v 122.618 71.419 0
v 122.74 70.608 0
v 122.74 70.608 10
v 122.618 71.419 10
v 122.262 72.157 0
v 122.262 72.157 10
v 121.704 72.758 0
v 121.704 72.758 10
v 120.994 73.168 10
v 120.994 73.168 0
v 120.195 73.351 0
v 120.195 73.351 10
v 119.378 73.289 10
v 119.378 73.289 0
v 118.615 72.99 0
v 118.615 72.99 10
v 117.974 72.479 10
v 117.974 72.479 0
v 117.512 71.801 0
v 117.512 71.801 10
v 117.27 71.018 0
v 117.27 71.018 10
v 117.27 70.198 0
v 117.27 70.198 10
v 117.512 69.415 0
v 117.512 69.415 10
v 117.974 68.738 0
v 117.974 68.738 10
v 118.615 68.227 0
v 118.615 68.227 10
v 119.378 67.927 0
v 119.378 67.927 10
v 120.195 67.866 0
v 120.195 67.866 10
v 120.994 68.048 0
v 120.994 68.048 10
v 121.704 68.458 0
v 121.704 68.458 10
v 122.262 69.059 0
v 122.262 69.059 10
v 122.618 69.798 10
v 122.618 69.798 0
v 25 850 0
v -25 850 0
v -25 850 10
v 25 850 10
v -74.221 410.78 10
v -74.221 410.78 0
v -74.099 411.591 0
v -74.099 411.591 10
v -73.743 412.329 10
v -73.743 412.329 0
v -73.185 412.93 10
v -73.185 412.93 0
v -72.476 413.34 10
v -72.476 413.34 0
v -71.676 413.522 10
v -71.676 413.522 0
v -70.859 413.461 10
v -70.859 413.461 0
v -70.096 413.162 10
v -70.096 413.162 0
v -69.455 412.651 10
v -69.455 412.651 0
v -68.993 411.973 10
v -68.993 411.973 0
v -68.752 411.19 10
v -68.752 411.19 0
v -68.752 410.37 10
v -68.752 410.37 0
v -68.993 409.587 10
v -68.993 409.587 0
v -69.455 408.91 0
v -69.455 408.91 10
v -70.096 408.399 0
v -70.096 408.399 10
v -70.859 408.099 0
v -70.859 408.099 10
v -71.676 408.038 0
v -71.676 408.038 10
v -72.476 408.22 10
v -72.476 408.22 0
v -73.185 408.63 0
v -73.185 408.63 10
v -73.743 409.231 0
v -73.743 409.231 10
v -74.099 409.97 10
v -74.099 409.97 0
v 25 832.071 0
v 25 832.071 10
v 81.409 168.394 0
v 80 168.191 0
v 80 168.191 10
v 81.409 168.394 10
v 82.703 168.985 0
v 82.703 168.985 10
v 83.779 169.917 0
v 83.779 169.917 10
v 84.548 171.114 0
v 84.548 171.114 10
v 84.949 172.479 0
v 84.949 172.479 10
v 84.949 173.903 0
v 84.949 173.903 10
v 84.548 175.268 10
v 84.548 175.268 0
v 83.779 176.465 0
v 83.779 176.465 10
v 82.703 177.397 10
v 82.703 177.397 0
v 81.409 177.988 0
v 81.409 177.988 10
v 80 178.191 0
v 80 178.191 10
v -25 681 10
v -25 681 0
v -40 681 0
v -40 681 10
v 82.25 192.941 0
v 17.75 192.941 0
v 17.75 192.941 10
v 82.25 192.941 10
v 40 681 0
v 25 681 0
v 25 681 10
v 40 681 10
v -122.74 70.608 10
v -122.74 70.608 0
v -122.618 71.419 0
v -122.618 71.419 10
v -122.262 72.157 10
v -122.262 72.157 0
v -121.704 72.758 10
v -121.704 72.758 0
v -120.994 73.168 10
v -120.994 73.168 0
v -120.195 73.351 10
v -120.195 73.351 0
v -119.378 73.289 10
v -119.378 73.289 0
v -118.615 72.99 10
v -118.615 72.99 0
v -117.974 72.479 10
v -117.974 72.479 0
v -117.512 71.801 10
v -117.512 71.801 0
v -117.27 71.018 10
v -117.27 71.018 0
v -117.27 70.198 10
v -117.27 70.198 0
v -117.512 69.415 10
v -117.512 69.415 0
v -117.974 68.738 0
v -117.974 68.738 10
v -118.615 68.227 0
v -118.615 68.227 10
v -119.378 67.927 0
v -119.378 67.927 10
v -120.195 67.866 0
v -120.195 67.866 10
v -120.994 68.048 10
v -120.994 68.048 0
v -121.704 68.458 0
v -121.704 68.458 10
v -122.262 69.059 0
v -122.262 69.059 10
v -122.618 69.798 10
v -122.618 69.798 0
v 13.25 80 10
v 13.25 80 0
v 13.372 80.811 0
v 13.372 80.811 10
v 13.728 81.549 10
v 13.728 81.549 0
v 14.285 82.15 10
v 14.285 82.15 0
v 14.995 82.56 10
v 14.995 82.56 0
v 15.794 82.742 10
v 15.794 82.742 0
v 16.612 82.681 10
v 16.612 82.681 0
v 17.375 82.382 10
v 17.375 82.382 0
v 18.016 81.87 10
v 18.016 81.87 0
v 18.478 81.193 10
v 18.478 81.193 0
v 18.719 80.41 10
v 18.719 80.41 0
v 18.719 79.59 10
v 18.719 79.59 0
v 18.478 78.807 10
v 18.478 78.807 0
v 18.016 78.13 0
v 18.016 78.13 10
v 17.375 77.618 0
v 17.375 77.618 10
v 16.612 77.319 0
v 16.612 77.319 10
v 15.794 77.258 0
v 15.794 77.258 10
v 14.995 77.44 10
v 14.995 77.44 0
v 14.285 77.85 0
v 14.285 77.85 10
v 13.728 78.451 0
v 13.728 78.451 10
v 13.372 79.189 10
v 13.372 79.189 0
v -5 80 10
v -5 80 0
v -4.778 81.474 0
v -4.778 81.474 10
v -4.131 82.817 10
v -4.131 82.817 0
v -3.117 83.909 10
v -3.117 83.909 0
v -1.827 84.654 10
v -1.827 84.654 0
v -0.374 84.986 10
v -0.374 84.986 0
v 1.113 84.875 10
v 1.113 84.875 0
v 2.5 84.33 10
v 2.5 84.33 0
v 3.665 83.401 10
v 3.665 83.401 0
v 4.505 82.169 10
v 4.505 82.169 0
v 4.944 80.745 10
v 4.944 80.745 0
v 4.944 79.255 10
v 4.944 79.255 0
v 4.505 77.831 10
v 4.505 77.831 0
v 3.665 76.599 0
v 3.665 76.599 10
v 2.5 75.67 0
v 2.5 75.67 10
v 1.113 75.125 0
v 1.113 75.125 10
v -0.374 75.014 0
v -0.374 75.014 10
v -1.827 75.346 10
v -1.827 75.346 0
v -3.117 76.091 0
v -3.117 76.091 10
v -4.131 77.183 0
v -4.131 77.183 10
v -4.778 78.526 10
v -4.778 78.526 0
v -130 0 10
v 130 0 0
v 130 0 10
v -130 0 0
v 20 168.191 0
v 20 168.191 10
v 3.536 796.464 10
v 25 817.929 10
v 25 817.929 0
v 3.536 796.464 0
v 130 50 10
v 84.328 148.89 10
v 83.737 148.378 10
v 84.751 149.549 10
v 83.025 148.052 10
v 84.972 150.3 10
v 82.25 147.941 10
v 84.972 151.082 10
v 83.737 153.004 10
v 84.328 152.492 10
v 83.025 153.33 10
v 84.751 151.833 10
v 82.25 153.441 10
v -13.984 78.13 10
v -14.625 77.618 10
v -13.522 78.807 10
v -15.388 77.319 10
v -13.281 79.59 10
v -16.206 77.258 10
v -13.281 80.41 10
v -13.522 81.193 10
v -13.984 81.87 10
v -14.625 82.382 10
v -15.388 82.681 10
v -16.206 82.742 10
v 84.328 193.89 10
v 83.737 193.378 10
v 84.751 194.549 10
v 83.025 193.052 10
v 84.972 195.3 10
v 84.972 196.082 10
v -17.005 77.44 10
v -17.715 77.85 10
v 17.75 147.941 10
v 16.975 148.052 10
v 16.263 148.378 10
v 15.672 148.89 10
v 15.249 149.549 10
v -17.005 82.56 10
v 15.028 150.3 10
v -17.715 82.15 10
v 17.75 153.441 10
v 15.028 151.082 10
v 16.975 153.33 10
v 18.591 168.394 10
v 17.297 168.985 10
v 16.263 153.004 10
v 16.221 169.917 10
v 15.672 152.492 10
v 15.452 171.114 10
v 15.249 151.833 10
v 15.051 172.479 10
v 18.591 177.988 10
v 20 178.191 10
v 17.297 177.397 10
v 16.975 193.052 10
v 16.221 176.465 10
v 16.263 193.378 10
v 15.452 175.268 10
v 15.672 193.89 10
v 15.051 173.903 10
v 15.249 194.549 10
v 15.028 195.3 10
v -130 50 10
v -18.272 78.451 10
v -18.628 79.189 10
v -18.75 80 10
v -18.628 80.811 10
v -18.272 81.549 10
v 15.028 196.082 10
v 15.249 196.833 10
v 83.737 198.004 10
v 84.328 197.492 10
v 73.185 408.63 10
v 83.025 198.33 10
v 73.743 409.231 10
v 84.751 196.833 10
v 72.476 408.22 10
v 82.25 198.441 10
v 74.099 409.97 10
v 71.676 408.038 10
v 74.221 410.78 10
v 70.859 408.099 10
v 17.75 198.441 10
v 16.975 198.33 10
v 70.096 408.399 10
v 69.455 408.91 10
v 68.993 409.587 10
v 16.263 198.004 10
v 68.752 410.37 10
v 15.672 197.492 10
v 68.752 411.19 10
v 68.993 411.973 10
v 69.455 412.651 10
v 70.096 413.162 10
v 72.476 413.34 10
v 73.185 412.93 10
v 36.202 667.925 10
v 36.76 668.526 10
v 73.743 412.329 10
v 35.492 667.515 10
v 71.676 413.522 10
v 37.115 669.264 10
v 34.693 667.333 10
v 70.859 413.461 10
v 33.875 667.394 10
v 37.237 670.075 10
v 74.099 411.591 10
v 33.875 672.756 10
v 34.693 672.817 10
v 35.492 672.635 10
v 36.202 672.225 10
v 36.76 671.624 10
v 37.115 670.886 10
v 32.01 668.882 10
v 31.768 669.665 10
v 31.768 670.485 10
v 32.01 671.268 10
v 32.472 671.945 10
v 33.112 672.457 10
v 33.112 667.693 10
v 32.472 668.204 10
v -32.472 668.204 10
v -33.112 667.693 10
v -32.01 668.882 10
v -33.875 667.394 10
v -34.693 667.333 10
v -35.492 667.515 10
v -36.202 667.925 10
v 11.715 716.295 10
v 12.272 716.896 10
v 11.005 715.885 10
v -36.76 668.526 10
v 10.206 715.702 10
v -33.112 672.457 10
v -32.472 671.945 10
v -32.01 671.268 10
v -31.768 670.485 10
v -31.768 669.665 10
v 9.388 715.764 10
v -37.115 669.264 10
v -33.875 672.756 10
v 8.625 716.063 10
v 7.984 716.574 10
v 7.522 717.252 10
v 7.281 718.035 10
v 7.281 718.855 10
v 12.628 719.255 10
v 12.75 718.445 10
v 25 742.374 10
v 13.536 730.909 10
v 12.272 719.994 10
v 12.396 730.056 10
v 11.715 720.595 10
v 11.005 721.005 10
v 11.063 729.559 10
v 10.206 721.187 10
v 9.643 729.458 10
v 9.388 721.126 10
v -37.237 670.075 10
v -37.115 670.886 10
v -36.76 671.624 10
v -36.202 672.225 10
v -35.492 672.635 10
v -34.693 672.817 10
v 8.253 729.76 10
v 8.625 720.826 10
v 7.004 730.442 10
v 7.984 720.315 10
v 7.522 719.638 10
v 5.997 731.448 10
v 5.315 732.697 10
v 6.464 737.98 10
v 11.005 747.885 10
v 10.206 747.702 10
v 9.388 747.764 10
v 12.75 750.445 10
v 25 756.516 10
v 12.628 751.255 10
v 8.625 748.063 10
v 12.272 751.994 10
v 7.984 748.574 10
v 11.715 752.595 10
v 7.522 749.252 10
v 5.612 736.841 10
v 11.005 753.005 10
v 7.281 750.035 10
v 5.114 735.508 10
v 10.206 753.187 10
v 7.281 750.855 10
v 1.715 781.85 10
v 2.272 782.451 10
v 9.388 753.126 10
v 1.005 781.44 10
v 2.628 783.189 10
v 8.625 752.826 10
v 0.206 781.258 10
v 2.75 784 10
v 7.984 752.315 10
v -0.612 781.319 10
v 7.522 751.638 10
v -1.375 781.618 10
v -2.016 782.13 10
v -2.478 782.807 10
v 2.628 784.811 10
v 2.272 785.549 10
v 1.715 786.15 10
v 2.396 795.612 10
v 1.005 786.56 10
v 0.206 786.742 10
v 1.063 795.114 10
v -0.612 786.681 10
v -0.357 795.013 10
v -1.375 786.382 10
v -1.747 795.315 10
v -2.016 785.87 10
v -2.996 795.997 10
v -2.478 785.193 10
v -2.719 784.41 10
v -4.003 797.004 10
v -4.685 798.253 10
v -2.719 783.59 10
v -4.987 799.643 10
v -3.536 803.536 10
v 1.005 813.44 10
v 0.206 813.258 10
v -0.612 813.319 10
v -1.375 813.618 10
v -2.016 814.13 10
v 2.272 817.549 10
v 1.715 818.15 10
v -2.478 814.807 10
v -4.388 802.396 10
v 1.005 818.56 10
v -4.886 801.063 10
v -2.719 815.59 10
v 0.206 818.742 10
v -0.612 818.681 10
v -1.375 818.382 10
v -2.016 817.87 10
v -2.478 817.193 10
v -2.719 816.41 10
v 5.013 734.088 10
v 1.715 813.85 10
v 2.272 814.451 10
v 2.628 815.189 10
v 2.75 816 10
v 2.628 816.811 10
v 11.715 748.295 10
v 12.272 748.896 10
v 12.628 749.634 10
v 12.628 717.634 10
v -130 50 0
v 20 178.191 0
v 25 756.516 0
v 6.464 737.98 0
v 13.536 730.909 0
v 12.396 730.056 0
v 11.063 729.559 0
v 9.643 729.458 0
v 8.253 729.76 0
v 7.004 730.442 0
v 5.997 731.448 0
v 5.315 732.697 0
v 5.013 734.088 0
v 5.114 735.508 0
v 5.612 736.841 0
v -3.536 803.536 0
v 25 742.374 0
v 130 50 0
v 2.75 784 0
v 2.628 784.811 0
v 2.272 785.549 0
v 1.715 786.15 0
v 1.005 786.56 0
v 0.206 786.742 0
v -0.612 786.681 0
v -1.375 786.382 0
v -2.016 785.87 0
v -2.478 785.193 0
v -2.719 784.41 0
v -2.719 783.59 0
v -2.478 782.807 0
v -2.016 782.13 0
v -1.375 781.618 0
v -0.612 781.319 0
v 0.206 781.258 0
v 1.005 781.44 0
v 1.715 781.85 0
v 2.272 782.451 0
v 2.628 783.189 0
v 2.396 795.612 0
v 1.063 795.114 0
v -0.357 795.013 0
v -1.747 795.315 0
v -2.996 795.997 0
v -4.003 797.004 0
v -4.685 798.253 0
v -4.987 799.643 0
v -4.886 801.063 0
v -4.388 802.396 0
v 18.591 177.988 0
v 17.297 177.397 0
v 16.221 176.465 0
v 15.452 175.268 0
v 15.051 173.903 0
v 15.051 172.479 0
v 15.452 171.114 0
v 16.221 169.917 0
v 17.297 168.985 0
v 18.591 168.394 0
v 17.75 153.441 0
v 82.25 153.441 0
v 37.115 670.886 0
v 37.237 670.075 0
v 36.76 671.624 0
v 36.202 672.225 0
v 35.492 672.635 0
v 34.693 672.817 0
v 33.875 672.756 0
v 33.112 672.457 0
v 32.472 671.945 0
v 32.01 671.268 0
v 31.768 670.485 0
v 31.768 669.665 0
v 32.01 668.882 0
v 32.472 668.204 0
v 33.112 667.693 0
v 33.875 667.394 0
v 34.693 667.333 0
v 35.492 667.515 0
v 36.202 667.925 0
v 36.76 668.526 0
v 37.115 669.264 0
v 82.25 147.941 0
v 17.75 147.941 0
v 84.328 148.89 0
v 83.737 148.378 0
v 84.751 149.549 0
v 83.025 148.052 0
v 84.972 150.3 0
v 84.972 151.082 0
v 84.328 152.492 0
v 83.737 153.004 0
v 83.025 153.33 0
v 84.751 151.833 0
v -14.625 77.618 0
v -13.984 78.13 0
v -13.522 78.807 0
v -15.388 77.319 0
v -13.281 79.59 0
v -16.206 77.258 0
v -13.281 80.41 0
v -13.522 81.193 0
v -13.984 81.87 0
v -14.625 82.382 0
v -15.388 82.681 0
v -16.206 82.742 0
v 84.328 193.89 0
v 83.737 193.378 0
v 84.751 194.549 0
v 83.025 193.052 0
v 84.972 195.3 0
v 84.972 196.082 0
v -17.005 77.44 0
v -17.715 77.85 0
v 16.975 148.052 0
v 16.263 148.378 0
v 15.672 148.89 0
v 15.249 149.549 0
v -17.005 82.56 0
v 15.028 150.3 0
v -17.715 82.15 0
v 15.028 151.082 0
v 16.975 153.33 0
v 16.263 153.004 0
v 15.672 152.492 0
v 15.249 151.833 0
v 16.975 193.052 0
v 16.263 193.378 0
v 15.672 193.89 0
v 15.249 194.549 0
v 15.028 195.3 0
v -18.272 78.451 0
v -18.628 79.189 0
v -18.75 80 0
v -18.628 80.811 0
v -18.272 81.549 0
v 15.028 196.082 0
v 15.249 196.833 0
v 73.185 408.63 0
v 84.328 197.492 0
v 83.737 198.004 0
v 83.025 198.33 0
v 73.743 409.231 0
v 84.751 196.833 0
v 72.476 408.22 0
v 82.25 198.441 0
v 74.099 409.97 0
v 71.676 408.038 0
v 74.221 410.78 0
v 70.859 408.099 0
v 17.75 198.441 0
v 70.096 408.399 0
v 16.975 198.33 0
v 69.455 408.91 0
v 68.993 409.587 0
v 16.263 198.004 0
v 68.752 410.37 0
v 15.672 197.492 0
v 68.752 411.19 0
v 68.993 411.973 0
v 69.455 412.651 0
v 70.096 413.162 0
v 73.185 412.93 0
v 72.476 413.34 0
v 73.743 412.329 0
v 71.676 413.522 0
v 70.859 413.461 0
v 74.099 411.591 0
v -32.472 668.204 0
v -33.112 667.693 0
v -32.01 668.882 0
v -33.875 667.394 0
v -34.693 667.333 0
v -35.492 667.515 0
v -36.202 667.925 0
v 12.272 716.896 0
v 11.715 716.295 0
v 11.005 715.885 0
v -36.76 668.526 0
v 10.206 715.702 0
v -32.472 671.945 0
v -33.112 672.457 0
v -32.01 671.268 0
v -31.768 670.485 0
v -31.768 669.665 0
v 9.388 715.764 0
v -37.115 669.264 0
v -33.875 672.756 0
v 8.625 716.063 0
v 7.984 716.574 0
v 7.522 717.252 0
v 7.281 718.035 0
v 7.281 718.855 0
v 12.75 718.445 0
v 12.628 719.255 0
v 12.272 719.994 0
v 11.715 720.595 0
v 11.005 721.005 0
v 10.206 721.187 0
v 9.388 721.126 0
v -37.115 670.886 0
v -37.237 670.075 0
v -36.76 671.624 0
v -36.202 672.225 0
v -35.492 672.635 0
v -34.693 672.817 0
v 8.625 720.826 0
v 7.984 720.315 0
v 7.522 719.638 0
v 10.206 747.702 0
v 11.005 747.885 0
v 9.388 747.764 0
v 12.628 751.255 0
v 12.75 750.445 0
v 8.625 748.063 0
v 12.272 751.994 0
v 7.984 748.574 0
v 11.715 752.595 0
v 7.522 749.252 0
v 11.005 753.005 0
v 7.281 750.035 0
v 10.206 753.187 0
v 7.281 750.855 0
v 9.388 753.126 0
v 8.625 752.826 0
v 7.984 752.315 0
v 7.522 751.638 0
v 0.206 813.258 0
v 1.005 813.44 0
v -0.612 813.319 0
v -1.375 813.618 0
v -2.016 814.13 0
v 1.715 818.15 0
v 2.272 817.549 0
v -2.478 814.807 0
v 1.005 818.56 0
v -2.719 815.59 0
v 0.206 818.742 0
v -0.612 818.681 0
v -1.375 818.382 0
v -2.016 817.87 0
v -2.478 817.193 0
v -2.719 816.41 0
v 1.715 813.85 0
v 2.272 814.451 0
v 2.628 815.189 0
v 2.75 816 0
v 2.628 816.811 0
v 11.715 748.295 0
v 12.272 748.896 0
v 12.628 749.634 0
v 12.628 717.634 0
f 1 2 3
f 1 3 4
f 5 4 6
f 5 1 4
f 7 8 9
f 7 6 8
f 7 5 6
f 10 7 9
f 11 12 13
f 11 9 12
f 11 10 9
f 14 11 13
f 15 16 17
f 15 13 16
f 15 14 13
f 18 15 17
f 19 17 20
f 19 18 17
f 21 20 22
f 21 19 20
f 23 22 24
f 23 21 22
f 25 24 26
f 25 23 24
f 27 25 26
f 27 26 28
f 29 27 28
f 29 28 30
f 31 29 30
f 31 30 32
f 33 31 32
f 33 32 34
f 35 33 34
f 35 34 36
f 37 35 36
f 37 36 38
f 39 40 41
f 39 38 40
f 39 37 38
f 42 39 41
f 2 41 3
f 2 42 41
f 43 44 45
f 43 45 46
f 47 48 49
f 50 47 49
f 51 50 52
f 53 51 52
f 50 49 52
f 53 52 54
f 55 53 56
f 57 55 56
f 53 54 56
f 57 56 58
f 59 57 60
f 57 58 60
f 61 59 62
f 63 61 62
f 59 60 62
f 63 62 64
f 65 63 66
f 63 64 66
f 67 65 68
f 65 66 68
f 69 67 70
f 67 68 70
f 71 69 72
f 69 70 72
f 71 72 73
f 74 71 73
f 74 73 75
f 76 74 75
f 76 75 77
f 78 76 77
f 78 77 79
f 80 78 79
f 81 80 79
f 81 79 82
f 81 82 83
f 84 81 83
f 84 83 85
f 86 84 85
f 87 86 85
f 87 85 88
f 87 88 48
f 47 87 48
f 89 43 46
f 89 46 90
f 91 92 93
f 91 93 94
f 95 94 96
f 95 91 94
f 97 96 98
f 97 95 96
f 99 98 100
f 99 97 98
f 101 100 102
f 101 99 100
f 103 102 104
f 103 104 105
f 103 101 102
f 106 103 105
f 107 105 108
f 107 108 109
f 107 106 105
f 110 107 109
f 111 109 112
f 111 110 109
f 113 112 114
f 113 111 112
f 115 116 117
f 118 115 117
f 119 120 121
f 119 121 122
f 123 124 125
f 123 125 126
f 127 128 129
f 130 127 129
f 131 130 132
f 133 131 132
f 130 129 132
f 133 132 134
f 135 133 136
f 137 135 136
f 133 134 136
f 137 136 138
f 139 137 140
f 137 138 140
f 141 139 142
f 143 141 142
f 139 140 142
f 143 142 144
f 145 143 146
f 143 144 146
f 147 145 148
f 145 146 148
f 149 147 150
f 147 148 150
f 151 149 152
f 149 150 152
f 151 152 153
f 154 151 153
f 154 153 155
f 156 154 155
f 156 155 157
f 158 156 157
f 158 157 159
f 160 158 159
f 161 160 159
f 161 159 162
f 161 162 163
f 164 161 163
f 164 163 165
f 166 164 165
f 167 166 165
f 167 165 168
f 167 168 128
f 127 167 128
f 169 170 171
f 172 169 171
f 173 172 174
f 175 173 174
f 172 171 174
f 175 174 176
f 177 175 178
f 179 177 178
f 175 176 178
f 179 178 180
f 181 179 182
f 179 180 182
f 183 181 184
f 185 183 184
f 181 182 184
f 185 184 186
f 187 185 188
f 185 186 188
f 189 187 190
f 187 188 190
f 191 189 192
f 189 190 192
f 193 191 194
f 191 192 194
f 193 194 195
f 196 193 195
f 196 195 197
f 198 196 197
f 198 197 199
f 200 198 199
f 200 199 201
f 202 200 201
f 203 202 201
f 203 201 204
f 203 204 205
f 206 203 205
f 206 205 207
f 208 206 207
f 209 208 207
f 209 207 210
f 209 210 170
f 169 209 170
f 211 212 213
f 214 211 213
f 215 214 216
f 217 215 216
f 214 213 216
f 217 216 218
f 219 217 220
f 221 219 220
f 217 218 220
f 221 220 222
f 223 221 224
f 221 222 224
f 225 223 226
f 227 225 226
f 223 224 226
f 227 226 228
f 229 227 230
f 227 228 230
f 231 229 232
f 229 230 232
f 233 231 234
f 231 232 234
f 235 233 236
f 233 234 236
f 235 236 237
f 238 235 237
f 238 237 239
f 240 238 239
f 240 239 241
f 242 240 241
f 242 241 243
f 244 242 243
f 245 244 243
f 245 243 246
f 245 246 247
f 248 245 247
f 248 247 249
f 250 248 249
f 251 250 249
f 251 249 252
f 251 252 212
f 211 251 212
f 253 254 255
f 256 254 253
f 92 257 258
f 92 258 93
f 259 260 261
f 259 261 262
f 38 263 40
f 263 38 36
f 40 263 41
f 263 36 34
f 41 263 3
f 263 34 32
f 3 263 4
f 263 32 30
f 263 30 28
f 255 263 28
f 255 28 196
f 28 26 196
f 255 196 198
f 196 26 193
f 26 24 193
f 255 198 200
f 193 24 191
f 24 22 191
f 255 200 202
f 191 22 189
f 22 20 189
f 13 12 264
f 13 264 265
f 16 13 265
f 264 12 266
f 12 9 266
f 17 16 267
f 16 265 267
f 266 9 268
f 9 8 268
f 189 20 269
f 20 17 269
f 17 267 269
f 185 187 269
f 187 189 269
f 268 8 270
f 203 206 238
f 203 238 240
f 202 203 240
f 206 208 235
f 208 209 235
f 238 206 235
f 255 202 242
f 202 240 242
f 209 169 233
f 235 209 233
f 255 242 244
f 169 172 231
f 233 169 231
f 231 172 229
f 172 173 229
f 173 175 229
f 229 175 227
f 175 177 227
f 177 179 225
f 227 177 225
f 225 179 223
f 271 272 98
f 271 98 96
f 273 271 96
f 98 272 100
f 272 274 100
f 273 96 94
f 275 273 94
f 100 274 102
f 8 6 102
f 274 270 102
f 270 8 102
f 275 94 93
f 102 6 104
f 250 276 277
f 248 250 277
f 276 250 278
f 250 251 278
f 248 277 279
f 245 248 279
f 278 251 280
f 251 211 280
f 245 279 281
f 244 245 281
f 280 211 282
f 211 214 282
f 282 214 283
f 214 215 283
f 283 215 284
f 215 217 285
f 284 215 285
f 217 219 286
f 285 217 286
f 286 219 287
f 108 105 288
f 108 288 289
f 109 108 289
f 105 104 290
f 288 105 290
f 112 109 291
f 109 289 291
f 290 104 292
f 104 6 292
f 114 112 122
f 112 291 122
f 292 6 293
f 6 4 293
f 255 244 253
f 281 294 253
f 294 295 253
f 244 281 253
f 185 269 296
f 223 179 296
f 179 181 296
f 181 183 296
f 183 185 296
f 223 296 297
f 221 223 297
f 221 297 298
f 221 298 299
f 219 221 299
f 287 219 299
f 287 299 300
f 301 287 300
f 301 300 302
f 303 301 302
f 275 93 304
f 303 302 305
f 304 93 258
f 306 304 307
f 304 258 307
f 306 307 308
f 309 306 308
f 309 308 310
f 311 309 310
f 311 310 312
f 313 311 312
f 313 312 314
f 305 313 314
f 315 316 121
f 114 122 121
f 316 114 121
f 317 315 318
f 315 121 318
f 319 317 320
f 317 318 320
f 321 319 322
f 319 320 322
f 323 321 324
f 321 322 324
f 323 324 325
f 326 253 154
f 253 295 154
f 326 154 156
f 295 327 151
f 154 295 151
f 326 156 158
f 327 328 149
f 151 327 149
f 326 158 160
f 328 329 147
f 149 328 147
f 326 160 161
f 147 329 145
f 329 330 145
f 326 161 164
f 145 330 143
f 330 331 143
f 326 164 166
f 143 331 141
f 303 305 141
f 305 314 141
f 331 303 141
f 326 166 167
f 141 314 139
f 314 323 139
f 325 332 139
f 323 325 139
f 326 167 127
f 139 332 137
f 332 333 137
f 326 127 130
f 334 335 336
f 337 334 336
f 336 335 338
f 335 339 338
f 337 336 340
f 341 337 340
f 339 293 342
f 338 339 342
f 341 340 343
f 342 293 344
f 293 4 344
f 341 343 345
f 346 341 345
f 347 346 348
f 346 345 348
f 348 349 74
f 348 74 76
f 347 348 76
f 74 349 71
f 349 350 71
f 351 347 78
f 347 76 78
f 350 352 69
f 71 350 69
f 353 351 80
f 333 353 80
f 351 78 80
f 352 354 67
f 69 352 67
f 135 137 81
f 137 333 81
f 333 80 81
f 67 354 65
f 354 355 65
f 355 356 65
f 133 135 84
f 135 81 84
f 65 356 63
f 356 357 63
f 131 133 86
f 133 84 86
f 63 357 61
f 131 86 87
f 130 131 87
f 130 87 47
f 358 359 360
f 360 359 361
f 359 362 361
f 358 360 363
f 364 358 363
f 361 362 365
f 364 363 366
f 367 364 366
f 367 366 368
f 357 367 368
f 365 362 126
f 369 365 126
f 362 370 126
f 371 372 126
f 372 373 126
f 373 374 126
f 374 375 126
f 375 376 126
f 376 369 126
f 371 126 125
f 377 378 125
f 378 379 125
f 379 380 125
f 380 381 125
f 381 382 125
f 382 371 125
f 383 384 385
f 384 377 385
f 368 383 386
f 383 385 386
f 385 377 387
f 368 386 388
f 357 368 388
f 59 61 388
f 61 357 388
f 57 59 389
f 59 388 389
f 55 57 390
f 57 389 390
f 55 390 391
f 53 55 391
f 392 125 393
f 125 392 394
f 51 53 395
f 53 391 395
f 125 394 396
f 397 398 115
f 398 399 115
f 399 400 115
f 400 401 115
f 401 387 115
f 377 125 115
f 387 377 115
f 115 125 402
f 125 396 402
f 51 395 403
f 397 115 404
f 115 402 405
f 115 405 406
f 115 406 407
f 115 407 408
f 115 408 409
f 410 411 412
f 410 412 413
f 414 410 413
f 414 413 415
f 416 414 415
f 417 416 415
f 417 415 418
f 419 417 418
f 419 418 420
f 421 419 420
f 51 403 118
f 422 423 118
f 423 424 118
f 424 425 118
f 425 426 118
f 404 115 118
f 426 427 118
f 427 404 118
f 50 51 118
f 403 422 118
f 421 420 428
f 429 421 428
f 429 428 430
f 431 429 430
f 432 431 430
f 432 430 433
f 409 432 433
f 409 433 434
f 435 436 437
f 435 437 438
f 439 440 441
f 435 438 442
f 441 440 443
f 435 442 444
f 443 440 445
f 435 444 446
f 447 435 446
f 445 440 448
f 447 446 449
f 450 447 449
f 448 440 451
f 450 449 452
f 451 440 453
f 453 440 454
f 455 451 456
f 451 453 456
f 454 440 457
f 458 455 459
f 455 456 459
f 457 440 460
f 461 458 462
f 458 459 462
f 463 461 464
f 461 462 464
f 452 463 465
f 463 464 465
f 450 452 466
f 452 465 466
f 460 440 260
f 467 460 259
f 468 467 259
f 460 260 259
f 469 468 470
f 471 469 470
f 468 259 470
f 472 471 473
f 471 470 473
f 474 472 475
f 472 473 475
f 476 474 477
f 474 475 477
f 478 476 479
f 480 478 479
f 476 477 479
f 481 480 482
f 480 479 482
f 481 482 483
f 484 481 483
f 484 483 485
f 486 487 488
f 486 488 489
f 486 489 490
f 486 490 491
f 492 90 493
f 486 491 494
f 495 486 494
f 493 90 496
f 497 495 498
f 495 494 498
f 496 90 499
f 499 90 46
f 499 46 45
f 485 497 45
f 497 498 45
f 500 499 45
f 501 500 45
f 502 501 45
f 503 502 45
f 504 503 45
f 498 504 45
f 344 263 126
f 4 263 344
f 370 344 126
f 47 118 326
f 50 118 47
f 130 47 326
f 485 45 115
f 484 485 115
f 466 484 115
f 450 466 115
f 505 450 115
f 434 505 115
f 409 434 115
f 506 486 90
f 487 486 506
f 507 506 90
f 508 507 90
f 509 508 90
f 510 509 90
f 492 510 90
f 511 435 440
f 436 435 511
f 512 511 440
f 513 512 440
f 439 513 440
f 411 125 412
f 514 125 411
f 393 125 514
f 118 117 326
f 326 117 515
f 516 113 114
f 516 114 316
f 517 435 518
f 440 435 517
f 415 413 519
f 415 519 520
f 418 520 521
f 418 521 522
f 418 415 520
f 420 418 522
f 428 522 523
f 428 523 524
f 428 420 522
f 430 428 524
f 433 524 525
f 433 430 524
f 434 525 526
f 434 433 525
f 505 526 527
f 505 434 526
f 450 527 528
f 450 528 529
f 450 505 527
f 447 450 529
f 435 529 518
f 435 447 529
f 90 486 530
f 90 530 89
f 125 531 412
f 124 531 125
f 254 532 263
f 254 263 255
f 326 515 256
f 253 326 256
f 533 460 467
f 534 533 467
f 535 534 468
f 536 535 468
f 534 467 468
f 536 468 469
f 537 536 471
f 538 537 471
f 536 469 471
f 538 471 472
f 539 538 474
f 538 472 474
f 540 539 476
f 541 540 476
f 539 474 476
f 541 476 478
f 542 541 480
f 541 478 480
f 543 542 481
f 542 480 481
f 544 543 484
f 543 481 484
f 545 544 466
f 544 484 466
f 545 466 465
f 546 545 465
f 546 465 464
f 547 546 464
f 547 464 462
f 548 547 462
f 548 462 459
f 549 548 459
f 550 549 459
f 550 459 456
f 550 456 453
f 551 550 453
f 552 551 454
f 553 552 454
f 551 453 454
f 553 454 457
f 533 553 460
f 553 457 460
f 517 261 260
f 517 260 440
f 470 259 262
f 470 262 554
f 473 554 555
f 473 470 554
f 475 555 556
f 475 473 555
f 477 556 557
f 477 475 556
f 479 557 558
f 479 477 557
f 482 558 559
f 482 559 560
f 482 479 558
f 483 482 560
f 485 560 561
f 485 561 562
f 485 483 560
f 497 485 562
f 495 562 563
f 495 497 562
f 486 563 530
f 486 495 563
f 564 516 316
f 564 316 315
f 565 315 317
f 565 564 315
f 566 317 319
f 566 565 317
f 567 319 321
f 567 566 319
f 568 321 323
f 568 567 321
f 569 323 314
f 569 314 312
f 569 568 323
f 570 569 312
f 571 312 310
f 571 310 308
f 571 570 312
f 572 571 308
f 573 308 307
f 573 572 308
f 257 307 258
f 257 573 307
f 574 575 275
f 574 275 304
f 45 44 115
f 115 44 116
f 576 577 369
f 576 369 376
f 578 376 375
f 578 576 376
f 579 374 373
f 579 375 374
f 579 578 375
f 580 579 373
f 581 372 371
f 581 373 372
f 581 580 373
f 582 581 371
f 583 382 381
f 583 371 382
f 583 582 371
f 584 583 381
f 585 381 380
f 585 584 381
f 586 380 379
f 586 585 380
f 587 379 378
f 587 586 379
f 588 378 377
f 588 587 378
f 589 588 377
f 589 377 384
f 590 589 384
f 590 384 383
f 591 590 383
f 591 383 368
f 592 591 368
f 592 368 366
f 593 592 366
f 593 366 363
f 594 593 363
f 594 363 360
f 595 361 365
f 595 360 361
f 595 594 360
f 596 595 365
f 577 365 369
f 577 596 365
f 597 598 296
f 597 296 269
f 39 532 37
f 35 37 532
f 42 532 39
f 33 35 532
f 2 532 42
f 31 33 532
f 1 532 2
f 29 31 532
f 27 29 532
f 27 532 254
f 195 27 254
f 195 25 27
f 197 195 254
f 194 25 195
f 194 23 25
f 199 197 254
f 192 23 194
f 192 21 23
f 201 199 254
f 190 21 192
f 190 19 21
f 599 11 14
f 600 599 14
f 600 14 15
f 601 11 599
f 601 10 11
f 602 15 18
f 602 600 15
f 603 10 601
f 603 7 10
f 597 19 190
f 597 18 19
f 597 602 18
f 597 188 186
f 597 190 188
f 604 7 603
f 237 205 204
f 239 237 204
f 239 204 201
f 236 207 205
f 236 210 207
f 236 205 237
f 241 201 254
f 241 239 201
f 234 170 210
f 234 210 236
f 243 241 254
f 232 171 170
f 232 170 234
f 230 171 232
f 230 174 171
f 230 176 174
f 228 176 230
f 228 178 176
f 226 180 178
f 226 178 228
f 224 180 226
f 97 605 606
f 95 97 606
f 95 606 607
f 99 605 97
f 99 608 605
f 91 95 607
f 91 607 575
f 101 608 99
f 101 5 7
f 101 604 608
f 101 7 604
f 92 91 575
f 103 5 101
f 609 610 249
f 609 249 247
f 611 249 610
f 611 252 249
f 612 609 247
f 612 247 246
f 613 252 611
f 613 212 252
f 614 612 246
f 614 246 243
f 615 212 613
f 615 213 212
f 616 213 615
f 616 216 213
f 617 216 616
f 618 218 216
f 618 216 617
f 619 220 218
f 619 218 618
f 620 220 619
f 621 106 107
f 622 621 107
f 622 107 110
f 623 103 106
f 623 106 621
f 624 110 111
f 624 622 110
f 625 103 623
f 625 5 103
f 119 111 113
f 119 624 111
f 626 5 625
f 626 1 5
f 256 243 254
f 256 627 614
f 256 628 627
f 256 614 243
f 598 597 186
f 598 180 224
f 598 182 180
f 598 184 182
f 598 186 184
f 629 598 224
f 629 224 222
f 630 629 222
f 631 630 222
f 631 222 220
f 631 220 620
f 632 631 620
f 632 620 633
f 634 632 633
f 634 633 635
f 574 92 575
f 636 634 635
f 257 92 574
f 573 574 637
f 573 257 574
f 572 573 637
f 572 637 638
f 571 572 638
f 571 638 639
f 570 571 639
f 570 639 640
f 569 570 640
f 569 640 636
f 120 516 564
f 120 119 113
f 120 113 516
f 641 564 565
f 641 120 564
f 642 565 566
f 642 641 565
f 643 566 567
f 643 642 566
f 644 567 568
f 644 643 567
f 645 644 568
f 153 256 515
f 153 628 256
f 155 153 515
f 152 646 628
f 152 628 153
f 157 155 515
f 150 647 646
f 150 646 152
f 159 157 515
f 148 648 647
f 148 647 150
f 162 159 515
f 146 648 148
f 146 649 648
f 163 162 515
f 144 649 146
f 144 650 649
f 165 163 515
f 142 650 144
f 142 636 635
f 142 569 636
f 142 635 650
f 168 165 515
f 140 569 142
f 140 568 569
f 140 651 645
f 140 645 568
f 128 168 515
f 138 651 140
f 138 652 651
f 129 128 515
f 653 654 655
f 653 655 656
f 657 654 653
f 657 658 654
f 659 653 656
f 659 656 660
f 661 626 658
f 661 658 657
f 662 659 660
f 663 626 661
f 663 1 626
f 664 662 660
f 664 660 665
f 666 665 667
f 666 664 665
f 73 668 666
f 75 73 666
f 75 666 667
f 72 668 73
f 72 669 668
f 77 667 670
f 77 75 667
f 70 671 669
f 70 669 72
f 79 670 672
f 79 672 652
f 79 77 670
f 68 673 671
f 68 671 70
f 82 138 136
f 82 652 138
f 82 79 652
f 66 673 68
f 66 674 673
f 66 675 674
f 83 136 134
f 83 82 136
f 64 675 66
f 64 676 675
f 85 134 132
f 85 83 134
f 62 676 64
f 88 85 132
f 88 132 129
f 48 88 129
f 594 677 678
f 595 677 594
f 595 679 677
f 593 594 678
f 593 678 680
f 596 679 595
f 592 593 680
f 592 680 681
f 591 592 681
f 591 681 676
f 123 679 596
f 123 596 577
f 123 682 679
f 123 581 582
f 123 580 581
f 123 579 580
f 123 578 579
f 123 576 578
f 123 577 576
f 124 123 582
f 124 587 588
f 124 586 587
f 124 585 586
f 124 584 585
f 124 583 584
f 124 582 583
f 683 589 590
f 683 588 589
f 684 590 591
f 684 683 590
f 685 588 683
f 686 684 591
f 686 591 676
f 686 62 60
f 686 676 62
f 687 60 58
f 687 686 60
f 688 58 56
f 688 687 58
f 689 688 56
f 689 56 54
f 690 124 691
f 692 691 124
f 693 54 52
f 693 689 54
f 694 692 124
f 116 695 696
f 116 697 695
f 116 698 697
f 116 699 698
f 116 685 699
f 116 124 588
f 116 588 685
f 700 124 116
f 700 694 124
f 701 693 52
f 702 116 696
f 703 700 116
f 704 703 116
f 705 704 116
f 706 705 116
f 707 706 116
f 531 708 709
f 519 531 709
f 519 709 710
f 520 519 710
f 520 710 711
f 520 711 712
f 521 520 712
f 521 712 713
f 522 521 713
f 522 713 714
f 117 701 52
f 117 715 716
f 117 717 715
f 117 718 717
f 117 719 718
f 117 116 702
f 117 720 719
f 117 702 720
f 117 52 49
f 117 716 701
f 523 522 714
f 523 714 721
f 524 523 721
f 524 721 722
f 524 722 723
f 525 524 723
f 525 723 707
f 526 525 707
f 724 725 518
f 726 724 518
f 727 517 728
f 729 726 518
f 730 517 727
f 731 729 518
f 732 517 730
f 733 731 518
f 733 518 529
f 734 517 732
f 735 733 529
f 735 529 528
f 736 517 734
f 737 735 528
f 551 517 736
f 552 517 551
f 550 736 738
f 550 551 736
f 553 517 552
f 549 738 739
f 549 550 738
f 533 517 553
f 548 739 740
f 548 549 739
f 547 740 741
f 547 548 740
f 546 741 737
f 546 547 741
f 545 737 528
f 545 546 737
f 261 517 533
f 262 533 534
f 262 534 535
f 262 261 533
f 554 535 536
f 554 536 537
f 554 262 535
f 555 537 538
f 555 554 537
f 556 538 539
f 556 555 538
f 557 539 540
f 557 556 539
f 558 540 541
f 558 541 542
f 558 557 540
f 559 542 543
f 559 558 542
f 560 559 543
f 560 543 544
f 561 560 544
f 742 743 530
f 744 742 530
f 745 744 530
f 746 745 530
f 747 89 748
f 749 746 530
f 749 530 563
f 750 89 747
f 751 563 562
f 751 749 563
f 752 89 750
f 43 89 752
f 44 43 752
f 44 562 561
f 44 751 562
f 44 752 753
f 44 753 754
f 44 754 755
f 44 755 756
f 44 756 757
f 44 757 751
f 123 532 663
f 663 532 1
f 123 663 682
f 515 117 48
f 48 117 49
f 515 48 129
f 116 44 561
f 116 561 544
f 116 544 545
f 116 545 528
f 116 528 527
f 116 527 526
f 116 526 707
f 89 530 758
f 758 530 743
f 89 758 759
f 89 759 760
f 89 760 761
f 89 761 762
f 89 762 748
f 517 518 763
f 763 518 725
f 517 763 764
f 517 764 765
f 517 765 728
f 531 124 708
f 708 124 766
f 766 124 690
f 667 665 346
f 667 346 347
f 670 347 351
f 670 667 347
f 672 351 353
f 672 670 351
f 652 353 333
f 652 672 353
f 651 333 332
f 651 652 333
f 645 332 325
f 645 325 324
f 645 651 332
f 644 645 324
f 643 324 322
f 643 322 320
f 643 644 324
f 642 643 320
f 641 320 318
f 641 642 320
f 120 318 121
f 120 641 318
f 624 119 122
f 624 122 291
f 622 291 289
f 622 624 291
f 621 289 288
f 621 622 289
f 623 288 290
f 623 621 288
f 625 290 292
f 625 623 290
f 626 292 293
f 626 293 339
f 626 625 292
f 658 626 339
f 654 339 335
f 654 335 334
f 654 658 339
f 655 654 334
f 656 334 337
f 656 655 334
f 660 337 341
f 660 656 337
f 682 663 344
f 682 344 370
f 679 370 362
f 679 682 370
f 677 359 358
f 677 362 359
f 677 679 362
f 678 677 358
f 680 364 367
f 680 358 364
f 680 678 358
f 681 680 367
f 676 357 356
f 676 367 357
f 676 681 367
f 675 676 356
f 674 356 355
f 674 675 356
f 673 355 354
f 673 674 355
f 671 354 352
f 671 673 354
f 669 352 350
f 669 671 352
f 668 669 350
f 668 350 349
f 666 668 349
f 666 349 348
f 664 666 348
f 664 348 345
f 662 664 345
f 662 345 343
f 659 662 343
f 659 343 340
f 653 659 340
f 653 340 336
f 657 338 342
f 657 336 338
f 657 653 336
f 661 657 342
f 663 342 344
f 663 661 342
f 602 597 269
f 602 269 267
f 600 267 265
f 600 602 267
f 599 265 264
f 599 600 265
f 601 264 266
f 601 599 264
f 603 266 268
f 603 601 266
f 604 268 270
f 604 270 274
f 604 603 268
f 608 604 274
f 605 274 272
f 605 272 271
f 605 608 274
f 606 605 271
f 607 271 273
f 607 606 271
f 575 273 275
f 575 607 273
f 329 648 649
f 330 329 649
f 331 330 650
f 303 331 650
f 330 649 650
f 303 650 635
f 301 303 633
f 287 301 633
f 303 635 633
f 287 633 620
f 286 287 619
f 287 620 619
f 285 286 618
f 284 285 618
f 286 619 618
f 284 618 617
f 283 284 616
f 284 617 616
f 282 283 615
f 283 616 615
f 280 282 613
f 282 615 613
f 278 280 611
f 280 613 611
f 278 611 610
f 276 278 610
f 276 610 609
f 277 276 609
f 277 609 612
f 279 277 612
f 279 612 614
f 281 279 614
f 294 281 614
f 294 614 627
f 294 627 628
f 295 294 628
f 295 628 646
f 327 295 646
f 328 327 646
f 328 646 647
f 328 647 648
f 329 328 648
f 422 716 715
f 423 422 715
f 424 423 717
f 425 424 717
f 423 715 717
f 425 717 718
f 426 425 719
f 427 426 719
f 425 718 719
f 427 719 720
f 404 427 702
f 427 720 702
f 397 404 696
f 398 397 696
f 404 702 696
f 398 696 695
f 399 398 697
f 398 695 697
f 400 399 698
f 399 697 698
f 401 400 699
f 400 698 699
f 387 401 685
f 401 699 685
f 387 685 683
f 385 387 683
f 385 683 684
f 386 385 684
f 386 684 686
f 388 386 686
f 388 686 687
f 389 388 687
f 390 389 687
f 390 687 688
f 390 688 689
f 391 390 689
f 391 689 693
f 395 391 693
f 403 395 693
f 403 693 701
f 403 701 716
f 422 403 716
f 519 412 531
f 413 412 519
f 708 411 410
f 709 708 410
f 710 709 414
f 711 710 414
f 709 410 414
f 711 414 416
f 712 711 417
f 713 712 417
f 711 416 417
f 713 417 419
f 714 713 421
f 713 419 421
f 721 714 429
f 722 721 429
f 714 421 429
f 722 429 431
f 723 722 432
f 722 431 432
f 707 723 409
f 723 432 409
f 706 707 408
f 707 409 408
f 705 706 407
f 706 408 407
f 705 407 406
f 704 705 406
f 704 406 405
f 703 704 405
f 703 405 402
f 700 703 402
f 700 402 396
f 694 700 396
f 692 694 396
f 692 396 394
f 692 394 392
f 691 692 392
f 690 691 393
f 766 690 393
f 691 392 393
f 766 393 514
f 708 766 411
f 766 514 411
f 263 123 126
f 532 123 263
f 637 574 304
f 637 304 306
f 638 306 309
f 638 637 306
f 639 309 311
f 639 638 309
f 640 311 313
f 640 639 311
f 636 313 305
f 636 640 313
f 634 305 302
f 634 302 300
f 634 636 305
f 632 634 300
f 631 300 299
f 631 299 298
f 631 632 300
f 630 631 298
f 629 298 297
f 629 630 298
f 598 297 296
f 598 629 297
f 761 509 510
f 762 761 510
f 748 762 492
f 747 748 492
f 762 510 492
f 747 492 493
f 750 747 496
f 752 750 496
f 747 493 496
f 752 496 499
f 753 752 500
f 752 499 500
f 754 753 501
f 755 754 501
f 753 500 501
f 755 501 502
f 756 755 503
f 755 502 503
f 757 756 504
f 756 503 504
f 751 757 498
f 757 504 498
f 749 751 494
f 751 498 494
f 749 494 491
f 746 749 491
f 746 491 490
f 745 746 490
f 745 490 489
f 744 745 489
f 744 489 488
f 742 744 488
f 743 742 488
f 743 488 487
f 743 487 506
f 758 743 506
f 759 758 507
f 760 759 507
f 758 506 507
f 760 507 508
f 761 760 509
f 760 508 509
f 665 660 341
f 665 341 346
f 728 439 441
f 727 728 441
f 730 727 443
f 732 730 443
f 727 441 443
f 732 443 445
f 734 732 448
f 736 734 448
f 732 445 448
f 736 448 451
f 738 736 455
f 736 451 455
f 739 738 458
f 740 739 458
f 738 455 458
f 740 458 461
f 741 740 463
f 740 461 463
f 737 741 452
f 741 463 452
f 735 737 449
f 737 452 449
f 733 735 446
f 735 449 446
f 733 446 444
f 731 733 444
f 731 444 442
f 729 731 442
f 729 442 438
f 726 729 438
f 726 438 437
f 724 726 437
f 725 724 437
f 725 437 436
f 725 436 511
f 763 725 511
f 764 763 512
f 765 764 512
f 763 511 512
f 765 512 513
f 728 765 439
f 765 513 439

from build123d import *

# Parameters (mm, degrees)
AUFSATZ_LINEAR_AUSTRAGEN1_DEPTH       = 10
SKIZZE17_R                            = 2.75
SCHNITT_LINEAR_AUSTRAGEN1_DEPTH       = 10
F_10_0_10_DURCHMESSER_BOHRUNG1_D      = 10
F_5_5_5_5_DURCHMESSER_BOHRUNG2_D      = 5.5
F_10_0_10_DURCHMESSER_LANGLOCH2_DEPTH = 10
F_5_5_5_5_DURCHMESSER_LANGLOCH2_DEPTH = 10
F_5_5_5_5_DURCHMESSER_BOHRUNG3_D      = 5.5


# Read off the part's stored shape, not the designer's step: Ø10.0 (10) Durchmesser Langloch2, Ø5.5 (5.5) Durchmesser Langloch2
with BuildPart() as part:
    # Skizze1 → Aufsatz-Linear austragen1 (new body)
    with BuildSketch(Plane.XY):
        Polygon((-40, 681), (-130, 50), (-130, 0), (0, 0), (0, 800), (0, 850), (-25, 850), (-25, 800), (-25, 681), align=None)
    aufsatz_linear_austragen1 = extrude(amount=AUFSATZ_LINEAR_AUSTRAGEN1_DEPTH)

    # Spiegeln1: Aufsatz-Linear austragen1 across plane
    add(aufsatz_linear_austragen1.mirror(Plane(origin=(0, 800, 10), x_dir=(0, 0, 1), z_dir=(1, 0, 0))))

    # Skizze17 → Schnitt-Linear austragen1 (cut)
    with BuildSketch(Plane.XY.offset(10)):
        with Locations((0, 816)):
            Circle(SKIZZE17_R)
        with Locations((0, 784)):
            Circle(SKIZZE17_R)
        with Locations((10, 750.444801834)):
            Circle(SKIZZE17_R)
        with Locations((10, 718.444801834)):
            Circle(SKIZZE17_R)
        with BuildLine():
            Line((-3.535533906, 803.535533906), (25, 832.071067812))
            ThreePointArc((25, 832.071067812), (32.071067812, 832.071067812), (32.071067812, 825))
            Line((32.071067812, 825), (3.535533906, 796.464466094))
            ThreePointArc((3.535533906, 796.464466094), (-3.535533906, 796.464466094), (-3.535533906, 803.535533906))
        make_face()
        with BuildLine():
            Line((6.464466094, 737.98033574), (25, 756.515869646))
            ThreePointArc((25, 756.515869646), (32.071067812, 756.515869646), (32.071067812, 749.444801834))
            Line((32.071067812, 749.444801834), (13.535533906, 730.909267928))
            ThreePointArc((13.535533906, 730.909267928), (6.464466094, 730.909267928), (6.464466094, 737.98033574))
        make_face()
    extrude(amount=-SCHNITT_LINEAR_AUSTRAGEN1_DEPTH, mode=Mode.SUBTRACT)

    # Ø10.0 (10) Durchmesser Bohrung1 (through all)
    with Locations(Plane.XY.offset(10)):
        with Locations((0, 80)):
            Hole(F_10_0_10_DURCHMESSER_BOHRUNG1_D / 2)

    # Ø5.5 (5.5) Durchmesser Bohrung2 (through all)
    with Locations(Plane.XY.offset(10)):
        with Locations((-16, 80), (16, 80)):
            Hole(F_5_5_5_5_DURCHMESSER_BOHRUNG2_D / 2)

    # Ø10.0 (10) Durchmesser Langloch2 outline → Ø10.0 (10) Durchmesser Langloch2 (cut)
    with BuildSketch(Plane.XY):
        with BuildLine():
            Line((20, 168.190997141), (80, 168.190997141))
            ThreePointArc((80, 168.190997141), (85, 173.190997141), (80, 178.190997141))
            Line((80, 178.190997141), (20, 178.190997141))
            ThreePointArc((20, 178.190997141), (15, 173.190997141), (20, 168.190997141))
        make_face()
    extrude(amount=F_10_0_10_DURCHMESSER_LANGLOCH2_DEPTH, mode=Mode.SUBTRACT)

    # Ø5.5 (5.5) Durchmesser Langloch2 outline → Ø5.5 (5.5) Durchmesser Langloch2 (cut)
    with BuildSketch(Plane.XY):
        with BuildLine():
            Line((17.75, 147.940997141), (82.25, 147.940997141))
            ThreePointArc((82.25, 147.940997141), (85, 150.690997141), (82.25, 153.440997141))
            Line((82.25, 153.440997141), (17.75, 153.440997141))
            ThreePointArc((17.75, 153.440997141), (15, 150.690997141), (17.75, 147.940997141))
        make_face()
        with BuildLine():
            Line((17.75, 192.940997141), (82.25, 192.940997141))
            ThreePointArc((82.25, 192.940997141), (85, 195.690997141), (82.25, 198.440997141))
            Line((82.25, 198.440997141), (17.75, 198.440997141))
            ThreePointArc((17.75, 198.440997141), (15, 195.690997141), (17.75, 192.940997141))
        make_face()
    extrude(amount=F_5_5_5_5_DURCHMESSER_LANGLOCH2_DEPTH, mode=Mode.SUBTRACT)

    # Ø5.5 (5.5) Durchmesser Bohrung3 (through all)
    with Locations(Plane.XY.offset(10)):
        with Locations((-34.48740284, 670.074959222), (-71.470822821, 410.780092469), (-119.989782887, 70.608272452)):
            f_5_5_5_5_durchmesser_bohrung3 = Hole(F_5_5_5_5_DURCHMESSER_BOHRUNG3_D / 2)

    # Spiegeln2: Ø5.5 (5.5) Durchmesser Bohrung3 across plane
    add(f_5_5_5_5_durchmesser_bohrung3.mirror(Plane(origin=(0, 0, 0), x_dir=(0, 0, 1), z_dir=(1, 0, 0))), mode=Mode.SUBTRACT)


solid = part.part
